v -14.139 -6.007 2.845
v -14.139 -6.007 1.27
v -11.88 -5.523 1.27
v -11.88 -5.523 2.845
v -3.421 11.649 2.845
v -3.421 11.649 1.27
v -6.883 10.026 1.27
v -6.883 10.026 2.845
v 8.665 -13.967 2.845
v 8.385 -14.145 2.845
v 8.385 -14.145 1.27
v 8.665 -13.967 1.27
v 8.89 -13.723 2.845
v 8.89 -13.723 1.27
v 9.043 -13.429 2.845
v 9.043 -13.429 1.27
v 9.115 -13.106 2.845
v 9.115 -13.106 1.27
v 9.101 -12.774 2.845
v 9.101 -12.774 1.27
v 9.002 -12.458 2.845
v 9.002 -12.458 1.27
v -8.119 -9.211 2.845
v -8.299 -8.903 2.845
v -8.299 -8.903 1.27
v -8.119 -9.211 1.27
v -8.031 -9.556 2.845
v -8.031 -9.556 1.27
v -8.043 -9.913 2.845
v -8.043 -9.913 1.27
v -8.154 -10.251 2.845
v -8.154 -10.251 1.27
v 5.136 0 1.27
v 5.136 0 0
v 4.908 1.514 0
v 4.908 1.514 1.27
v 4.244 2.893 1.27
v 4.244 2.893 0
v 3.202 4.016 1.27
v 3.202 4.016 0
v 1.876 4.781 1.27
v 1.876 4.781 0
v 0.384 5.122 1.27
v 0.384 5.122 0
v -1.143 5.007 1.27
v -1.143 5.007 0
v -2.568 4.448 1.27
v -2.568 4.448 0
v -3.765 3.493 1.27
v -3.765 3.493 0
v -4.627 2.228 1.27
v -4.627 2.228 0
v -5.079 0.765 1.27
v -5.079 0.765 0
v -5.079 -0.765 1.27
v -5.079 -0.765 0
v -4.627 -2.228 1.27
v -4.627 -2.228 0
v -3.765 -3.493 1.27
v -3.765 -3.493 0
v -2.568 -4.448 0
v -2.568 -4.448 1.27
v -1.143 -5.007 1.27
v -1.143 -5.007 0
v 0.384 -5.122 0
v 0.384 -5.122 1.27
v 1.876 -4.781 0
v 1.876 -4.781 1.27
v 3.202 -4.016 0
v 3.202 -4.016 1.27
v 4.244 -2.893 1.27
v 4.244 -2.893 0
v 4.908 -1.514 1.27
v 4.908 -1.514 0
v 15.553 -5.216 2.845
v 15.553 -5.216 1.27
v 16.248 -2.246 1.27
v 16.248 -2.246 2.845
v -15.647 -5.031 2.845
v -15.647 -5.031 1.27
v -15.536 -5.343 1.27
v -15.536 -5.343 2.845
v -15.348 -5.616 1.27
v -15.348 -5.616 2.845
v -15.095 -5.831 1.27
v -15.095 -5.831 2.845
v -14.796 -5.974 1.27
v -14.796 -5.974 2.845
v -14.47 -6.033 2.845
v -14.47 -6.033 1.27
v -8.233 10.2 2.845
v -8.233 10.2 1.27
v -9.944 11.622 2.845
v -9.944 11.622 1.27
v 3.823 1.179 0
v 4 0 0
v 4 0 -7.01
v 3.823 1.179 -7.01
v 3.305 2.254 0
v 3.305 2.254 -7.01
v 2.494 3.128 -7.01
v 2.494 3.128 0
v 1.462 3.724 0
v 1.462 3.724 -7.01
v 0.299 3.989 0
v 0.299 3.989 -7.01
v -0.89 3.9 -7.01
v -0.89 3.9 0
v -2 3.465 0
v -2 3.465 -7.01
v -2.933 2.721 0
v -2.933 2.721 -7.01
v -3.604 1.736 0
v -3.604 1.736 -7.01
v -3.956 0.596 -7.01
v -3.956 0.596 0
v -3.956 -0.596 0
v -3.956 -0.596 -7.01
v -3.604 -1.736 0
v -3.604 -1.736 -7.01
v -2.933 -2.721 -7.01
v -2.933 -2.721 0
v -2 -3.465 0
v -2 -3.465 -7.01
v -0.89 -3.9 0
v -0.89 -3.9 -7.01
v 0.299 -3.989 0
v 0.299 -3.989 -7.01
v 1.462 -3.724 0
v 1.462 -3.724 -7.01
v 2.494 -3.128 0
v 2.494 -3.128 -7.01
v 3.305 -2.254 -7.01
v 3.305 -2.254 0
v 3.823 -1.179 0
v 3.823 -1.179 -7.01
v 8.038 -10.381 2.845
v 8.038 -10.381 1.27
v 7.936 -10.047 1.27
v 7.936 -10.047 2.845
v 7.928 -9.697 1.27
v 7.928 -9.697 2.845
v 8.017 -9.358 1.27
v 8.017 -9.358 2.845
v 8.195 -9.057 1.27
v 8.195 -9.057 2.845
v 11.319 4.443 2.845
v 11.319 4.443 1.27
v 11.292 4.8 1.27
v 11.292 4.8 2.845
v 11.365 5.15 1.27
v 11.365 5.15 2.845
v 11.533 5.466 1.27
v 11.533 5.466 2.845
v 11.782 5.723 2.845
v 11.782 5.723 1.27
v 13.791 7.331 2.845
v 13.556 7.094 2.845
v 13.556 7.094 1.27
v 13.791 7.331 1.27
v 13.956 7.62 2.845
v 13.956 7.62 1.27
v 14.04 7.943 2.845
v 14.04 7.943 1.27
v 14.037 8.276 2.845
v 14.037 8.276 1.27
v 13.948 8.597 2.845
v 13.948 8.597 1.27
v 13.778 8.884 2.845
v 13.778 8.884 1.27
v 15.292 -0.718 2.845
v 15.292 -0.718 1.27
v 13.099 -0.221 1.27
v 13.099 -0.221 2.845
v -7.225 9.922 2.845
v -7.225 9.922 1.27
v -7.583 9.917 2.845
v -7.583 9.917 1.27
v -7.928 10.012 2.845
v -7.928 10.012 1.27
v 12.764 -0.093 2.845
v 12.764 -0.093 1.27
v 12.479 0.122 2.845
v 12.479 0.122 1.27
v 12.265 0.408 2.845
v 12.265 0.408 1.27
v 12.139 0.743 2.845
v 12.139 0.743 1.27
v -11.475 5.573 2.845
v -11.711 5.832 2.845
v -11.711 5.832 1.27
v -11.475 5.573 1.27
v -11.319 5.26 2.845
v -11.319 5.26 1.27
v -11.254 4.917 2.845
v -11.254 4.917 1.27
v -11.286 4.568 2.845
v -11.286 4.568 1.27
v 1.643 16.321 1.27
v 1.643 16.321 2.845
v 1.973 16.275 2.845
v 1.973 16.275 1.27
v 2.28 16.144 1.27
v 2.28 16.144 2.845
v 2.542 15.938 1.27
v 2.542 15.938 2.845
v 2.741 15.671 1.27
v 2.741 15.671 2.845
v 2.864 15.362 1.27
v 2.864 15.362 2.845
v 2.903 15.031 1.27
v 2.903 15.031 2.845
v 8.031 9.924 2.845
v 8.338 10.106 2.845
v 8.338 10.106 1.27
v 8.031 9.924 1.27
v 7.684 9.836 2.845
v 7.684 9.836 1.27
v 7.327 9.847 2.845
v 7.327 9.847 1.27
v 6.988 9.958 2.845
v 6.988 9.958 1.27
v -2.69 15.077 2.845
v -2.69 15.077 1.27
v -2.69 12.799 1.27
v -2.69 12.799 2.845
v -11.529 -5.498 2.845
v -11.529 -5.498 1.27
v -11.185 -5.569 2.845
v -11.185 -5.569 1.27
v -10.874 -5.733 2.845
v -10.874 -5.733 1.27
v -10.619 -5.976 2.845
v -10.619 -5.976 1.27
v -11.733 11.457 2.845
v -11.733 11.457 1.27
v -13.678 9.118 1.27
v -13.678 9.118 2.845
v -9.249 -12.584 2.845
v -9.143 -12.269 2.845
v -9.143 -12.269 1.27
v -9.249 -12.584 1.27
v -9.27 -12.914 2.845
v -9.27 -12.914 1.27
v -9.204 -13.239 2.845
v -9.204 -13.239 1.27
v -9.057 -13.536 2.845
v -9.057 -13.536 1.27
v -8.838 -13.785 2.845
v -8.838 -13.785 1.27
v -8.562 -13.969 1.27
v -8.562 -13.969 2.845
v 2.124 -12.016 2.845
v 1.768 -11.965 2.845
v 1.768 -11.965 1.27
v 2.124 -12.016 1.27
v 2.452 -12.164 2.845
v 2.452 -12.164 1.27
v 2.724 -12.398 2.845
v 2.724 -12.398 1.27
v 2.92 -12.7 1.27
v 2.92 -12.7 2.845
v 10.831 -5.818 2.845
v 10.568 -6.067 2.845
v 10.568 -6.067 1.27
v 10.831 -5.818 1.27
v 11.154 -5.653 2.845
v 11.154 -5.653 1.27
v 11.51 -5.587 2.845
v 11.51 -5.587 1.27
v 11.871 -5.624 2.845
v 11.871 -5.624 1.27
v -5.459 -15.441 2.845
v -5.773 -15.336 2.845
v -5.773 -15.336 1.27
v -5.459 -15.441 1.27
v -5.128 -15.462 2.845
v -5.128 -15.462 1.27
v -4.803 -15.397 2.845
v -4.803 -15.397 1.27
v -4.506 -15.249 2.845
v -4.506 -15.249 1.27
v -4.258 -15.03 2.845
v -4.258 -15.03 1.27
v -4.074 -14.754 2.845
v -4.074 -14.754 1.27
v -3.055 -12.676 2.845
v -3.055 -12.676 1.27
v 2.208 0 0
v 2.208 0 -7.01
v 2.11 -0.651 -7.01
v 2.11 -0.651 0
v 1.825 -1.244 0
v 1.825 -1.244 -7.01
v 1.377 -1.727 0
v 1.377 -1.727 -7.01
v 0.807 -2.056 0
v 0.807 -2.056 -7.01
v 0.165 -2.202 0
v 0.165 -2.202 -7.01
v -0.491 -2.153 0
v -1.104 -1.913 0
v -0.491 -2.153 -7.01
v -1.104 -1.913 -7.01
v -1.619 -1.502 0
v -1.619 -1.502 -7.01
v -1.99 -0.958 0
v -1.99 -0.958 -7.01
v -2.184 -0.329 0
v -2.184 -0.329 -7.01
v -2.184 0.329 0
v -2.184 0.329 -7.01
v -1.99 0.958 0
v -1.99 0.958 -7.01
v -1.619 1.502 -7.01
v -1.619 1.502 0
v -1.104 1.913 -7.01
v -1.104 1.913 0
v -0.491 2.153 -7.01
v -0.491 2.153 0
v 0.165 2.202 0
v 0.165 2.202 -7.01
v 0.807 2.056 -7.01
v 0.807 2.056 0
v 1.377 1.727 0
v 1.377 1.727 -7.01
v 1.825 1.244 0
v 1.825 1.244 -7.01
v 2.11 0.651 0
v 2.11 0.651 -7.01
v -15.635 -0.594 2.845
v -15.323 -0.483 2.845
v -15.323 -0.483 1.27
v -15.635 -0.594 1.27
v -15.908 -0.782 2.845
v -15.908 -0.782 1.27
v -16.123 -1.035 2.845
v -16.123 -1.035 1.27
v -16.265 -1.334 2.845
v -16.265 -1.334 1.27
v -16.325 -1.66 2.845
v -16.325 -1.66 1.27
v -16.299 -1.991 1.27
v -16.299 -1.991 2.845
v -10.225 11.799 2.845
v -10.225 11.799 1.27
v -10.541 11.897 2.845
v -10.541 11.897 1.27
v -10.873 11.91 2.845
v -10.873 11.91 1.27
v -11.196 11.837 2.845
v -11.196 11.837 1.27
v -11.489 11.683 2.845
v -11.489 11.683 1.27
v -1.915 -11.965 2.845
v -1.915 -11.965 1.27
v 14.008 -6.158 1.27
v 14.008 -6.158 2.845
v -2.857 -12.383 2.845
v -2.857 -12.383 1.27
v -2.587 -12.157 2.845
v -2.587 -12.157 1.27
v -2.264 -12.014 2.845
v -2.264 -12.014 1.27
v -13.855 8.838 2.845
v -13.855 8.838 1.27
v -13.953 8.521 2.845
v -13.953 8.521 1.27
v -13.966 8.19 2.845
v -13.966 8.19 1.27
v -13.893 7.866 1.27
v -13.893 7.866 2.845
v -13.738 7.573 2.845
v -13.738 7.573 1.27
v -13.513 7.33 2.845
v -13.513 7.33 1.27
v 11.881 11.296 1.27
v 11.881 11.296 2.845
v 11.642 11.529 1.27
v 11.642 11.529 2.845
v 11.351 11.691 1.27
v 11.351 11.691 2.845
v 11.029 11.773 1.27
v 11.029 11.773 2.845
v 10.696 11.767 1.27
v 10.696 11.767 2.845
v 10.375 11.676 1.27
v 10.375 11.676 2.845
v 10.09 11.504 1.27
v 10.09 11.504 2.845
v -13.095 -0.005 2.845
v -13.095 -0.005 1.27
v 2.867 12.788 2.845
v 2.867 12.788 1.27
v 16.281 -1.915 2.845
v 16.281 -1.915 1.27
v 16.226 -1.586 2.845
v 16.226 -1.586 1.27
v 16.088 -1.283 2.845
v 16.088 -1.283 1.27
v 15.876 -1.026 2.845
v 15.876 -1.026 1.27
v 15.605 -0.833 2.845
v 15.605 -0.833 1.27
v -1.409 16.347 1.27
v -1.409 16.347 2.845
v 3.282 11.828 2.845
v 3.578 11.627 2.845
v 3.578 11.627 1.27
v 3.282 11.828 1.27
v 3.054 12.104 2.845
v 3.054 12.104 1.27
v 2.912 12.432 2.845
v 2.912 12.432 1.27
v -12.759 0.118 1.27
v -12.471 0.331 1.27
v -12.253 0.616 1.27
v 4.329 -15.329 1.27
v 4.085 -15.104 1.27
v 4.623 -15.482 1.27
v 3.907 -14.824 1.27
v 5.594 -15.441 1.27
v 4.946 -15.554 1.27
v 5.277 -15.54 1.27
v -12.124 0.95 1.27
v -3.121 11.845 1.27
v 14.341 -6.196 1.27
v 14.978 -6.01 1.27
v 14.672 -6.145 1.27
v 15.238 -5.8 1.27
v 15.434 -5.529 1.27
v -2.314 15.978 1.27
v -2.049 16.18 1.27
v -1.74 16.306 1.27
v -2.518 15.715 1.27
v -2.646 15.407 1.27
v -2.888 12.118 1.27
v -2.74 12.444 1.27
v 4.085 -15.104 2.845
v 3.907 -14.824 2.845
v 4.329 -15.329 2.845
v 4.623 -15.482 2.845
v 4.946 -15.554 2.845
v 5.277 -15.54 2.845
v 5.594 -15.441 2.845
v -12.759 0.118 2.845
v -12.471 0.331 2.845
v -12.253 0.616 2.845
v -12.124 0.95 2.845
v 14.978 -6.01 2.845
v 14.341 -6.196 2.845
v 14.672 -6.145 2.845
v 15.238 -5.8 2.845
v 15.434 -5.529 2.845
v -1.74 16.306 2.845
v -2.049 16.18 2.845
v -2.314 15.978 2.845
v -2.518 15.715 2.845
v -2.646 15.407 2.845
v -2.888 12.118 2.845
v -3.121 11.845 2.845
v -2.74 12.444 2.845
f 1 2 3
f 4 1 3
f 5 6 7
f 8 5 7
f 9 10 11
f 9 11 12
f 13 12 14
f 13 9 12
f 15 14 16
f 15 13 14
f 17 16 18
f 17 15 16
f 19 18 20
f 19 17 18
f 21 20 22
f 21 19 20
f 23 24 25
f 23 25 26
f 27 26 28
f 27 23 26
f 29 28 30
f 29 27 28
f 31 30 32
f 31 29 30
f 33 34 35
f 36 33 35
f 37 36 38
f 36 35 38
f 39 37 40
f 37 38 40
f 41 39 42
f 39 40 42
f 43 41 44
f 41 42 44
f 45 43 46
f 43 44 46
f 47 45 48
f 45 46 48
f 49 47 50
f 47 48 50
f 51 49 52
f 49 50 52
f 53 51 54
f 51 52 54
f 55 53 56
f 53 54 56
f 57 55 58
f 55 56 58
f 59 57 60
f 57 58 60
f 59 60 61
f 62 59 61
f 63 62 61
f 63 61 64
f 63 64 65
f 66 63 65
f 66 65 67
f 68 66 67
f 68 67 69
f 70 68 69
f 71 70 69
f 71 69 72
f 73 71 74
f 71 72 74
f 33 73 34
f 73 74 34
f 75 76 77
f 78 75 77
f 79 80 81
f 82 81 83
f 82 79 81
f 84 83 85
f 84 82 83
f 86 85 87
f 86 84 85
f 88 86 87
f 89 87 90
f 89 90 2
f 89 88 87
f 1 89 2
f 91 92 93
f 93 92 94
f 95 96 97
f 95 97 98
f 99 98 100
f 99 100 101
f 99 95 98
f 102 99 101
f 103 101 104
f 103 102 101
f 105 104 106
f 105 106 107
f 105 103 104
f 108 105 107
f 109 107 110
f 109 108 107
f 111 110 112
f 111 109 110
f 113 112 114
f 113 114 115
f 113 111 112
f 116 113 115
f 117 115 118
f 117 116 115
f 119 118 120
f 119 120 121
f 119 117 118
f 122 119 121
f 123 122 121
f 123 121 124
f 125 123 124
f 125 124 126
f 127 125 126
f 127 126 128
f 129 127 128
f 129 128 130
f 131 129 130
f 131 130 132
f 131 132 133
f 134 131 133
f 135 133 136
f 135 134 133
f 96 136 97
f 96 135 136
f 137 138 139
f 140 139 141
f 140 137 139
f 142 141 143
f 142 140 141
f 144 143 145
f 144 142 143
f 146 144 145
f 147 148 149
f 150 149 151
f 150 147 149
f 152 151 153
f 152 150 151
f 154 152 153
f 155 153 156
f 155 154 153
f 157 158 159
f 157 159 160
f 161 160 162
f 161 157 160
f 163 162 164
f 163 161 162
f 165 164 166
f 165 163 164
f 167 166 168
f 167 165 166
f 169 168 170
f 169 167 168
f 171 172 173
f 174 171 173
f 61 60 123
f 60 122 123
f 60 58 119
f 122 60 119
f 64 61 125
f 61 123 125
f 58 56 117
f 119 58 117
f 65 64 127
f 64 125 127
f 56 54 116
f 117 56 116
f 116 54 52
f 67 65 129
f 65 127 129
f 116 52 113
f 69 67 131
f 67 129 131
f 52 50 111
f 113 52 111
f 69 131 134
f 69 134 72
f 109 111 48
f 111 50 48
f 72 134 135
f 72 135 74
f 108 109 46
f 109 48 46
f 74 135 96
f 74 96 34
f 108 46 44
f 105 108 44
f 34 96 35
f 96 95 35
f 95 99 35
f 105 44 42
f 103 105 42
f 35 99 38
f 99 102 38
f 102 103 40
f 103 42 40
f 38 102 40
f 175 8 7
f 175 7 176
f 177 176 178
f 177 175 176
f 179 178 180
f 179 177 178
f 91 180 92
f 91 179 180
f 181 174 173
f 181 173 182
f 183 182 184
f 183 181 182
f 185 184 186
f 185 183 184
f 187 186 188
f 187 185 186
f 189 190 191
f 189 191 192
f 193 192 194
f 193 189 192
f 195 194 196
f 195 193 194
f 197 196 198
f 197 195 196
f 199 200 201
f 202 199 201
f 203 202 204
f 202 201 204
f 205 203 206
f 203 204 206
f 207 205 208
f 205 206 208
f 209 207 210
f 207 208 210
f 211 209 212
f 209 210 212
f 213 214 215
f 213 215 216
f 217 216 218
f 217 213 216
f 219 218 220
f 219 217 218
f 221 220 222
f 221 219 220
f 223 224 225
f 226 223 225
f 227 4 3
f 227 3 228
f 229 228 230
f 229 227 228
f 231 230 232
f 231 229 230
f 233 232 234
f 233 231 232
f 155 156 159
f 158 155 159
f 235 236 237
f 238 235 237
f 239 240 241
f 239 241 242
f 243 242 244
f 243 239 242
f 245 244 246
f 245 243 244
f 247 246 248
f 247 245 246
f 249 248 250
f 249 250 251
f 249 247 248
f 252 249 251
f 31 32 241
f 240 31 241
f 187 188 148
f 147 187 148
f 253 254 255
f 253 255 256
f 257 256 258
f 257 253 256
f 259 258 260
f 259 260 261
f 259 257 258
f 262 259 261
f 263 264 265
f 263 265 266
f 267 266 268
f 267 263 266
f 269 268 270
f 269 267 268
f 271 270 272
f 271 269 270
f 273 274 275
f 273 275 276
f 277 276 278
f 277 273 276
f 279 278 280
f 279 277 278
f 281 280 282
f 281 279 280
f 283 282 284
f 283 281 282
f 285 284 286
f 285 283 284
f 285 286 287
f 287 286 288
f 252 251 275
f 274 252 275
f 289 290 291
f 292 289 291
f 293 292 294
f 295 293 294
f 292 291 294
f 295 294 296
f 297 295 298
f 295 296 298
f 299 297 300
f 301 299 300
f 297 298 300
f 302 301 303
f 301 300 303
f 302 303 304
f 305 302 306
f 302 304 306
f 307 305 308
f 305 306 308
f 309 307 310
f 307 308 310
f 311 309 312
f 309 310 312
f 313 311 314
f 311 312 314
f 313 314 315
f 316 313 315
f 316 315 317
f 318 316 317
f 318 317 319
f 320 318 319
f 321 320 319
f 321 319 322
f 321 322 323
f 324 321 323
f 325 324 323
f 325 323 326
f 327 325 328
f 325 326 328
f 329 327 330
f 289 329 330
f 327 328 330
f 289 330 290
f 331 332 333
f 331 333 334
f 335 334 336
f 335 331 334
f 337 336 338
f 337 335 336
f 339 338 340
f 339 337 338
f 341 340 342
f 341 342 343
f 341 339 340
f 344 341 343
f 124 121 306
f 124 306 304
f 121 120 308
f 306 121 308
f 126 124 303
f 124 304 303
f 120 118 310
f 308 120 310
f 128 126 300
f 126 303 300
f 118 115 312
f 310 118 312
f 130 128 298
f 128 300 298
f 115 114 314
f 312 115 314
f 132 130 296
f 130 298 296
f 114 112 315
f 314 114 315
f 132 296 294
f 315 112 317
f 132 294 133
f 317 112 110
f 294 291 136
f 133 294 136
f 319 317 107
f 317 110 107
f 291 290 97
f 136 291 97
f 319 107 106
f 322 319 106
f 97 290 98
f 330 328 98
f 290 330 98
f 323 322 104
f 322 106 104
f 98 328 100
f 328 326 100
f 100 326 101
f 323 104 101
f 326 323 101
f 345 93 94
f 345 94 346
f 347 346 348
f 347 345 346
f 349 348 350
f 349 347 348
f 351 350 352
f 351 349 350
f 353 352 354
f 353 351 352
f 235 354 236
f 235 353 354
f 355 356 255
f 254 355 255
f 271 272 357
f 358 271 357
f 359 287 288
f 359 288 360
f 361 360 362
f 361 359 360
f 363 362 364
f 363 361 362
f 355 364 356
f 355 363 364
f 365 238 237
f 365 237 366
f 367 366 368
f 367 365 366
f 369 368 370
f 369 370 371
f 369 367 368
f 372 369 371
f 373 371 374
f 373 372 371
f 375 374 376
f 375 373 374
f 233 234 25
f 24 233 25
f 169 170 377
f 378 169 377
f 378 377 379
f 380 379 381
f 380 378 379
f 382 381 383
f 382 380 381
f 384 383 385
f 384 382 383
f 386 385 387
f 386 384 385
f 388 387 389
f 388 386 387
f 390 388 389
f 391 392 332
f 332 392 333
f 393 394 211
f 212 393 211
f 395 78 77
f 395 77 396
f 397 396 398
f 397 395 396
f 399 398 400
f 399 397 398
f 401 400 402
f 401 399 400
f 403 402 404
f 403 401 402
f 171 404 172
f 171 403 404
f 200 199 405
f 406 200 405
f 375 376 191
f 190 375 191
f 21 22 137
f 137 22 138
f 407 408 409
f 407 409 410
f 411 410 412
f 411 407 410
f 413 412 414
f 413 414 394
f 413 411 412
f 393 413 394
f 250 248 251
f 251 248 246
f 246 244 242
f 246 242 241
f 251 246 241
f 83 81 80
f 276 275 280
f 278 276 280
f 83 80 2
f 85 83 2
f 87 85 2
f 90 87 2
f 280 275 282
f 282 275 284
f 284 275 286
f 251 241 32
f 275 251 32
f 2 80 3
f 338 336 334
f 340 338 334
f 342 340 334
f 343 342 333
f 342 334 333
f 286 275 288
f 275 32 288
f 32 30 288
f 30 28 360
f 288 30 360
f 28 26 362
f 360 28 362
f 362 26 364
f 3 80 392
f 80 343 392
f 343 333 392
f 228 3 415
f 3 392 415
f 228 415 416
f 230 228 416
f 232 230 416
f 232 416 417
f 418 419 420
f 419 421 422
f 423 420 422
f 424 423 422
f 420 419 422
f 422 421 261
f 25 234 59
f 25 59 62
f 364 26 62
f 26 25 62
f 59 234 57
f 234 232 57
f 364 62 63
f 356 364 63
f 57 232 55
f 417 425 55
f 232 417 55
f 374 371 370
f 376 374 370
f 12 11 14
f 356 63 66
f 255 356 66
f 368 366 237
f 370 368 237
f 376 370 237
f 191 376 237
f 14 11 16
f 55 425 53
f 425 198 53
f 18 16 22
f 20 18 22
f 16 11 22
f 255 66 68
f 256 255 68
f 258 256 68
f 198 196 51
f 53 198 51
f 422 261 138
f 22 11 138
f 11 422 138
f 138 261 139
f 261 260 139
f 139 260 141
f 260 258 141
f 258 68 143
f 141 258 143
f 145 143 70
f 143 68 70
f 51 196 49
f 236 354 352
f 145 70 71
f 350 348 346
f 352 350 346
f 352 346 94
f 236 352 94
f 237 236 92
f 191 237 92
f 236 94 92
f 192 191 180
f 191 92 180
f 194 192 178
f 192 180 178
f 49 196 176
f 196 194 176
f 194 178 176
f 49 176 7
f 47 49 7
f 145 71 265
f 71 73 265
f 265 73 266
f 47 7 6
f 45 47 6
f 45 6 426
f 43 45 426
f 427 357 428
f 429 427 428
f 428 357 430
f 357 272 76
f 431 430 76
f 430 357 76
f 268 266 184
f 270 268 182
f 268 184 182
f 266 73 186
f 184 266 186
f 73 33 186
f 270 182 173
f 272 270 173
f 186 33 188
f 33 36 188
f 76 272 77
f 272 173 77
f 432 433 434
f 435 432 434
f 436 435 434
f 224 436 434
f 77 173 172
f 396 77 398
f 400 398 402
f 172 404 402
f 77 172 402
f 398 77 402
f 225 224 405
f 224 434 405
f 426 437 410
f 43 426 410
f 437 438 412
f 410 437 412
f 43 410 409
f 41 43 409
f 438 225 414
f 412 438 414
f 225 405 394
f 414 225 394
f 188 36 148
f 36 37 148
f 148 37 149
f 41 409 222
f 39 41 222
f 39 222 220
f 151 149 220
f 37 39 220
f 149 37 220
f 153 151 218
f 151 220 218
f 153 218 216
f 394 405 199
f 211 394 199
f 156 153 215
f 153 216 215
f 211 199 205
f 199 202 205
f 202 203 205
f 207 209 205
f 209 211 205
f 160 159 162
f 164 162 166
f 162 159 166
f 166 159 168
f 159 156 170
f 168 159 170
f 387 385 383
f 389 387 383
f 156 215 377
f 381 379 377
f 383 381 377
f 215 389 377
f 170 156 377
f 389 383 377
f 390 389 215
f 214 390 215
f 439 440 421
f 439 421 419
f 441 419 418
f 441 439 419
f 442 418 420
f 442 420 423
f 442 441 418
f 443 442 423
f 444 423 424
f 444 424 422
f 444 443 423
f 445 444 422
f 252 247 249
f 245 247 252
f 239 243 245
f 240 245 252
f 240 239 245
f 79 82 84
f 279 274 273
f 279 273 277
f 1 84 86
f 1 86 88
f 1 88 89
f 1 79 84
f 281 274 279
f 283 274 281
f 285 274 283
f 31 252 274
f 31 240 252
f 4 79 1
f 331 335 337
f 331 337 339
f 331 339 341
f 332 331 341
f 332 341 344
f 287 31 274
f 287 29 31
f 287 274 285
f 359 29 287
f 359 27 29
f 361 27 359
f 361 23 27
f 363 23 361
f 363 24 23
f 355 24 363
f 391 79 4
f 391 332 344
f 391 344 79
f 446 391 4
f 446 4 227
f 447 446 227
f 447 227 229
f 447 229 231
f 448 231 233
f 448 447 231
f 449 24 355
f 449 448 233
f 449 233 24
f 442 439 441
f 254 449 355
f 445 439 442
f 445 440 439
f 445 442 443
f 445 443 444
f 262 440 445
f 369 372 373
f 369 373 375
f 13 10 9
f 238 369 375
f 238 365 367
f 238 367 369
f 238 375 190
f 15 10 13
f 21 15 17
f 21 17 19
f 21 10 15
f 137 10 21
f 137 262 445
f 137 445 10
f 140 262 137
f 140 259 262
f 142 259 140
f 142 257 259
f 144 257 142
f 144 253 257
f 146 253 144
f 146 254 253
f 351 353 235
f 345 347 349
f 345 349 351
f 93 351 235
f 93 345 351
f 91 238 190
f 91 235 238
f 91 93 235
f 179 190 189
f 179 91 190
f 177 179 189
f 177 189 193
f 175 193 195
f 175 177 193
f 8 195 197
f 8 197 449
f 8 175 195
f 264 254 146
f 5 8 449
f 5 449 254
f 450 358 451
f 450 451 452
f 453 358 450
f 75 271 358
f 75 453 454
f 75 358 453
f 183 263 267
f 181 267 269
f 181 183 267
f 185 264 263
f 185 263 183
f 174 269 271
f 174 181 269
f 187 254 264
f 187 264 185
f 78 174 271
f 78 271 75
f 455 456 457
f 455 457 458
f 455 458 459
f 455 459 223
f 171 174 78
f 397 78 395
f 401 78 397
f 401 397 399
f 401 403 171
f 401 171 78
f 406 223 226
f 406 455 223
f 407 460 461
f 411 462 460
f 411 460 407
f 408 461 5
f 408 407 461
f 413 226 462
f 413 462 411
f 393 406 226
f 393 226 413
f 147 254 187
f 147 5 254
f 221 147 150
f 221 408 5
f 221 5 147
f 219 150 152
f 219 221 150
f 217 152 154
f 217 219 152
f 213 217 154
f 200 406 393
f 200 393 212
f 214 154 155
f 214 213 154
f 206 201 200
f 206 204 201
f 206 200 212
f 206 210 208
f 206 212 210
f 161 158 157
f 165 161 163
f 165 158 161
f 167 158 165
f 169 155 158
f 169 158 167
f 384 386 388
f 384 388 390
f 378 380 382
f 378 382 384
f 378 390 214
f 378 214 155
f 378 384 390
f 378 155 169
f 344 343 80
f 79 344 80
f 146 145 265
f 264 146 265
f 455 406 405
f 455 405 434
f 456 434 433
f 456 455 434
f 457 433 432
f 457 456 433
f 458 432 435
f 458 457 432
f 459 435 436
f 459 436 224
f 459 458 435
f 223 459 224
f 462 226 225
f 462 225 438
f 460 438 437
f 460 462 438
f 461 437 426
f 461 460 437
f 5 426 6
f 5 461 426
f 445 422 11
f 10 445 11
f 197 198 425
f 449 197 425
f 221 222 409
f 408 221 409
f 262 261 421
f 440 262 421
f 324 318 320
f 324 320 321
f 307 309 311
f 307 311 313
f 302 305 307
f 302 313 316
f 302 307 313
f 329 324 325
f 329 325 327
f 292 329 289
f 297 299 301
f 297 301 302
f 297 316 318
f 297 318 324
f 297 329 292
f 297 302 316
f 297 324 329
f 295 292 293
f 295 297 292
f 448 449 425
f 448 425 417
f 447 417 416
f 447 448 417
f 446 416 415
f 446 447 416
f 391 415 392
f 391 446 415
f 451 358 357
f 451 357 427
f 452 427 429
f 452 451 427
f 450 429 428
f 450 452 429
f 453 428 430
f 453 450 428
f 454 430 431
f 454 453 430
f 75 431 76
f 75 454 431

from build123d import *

# Parameters (mm, degrees)
F1_DEPTH  = 2.54
F2_SCALE  = 1.12
F3_R      = 1.27
F4_R      = 4.0005
F4_R_2    = 2.1462999284
F5_DEPTH  = 7.0104
F6_R      = 2.2083863112
F7_DEPTH  = 7.0104
F8_DEPTH  = 1.27
F9_R      = 5.1360331122
F10_DEPTH = 1.27


with BuildPart() as f1:
    # F0 (on Top) → F1 (new body)
    with BuildSketch(Plane.XY):
        Polygon((2.6097216178, 14.5627437159), (-2.4016266689, 14.6046923473), (-2.4016266689, 10.7069099322), (-6.7973635159, 8.6464090273), (-9.7507489845, 11.1018400639), (-12.9371215583, 7.269280193), (-9.9187448393, 4.759815731), (-10.987800546, 0.1461525389), (-14.7898914292, -0.6685812259), (-13.7329729143, -5.6008676039), (-9.9187448393, -4.7835330123), (-6.9650523365, -8.5103949532), (-8.662414737, -11.9730141014), (-4.136644538, -14.1915290003), (-2.4166579341, -10.6827564792), (2.3025460541, -10.6827564792), (3.9659612812, -14.2644541338), (8.5153820935, -12.1516080526), (6.8819414162, -8.6344521752), (9.8897544667, -4.8440932296), (13.6239528656, -5.7776425965), (14.7675592452, -0.8934023208), (10.9942825511, -0.0382388607), (9.9505092949, 4.6697063372), (13.008704409, 7.0334360935), (9.9016642198, 10.9836040065), (6.8838195875, 8.5752755404), (2.5481330231, 10.6975259259), align=None)
    extrude(amount=F1_DEPTH)


with BuildPart() as f1_1:
    # F2: moved
    add(f1.part.scale(F2_SCALE))

    # F3
    f3_edges = [f1_1.edges().sort_by_distance(p)[0] for p in [
        (-16.564678, -0.748811, 1.4224),
        (-12.306337, 0.163691, 1.4224),
        (-14.489576, 8.141594, 1.4224),
        (-10.920839, 12.434061, 1.4224),
        (-7.613047, 9.683978, 1.4224),
        (-2.689822, 11.991739, 1.4224),
        (-2.689822, 16.357255, 1.4224),
        (2.922888, 16.310273, 1.4224),
        (2.853909, 11.981229, 1.4224),
        (7.709878, 9.604309, 1.4224),
        (11.089864, 12.301636, 1.4224),
        (14.569749, 7.877448, 1.4224),
        (11.14457, 5.230071, 1.4224),
        (12.313596, -0.042828, 1.4224),
        (16.539666, -1.000611, 1.4224),
        (15.258827, -6.47096, 1.4224),
        (11.076525, -5.425384, 1.4224),
        (7.707774, -9.670586, 1.4224),
        (9.537228, -13.609801, 1.4224),
        (4.441877, -15.976189, 1.4224),
        (2.578852, -11.964687, 1.4224),
        (-2.706657, -11.964687, 1.4224),
        (-4.633042, -15.894512, 1.4224),
        (-9.701905, -13.409776, 1.4224),
        (-7.800859, -9.531642, 1.4224),
        (-11.108994, -5.357557, 1.4224),
        (-15.38093, -6.272972, 1.4224),
        (-11.108994, 5.330994, 1.4224),
    ]]
    fillet(f3_edges, radius=F3_R)

    # F4 (on face) → F5 (join)
    with BuildSketch(Plane.XY):
        Circle(F4_R)
        Circle(F4_R_2, mode=Mode.SUBTRACT)
        Circle(F4_R_2)
    extrude(amount=-F5_DEPTH)

    # F6 (on face) → F7 (cut)
    with BuildSketch(Plane(origin=(0, 0, -7.0104), x_dir=(1, 0, 0), z_dir=(0, 0, -1))):
        Circle(F6_R)
    extrude(amount=-F7_DEPTH, mode=Mode.SUBTRACT)

    # F8 (cut): a face of the model
    f8_faces = [f1_1.faces().sort_by_distance(p)[0] for p in [
        (5.0824398182, 10.382465325, 0),
    ]]
    extrude(f8_faces, amount=-F8_DEPTH, mode=Mode.SUBTRACT)

    # F9 (on face) → F10 (join)
    with BuildSketch(Plane.XY):
        Circle(F9_R)
    extrude(amount=F10_DEPTH)


solid = f1_1.part
